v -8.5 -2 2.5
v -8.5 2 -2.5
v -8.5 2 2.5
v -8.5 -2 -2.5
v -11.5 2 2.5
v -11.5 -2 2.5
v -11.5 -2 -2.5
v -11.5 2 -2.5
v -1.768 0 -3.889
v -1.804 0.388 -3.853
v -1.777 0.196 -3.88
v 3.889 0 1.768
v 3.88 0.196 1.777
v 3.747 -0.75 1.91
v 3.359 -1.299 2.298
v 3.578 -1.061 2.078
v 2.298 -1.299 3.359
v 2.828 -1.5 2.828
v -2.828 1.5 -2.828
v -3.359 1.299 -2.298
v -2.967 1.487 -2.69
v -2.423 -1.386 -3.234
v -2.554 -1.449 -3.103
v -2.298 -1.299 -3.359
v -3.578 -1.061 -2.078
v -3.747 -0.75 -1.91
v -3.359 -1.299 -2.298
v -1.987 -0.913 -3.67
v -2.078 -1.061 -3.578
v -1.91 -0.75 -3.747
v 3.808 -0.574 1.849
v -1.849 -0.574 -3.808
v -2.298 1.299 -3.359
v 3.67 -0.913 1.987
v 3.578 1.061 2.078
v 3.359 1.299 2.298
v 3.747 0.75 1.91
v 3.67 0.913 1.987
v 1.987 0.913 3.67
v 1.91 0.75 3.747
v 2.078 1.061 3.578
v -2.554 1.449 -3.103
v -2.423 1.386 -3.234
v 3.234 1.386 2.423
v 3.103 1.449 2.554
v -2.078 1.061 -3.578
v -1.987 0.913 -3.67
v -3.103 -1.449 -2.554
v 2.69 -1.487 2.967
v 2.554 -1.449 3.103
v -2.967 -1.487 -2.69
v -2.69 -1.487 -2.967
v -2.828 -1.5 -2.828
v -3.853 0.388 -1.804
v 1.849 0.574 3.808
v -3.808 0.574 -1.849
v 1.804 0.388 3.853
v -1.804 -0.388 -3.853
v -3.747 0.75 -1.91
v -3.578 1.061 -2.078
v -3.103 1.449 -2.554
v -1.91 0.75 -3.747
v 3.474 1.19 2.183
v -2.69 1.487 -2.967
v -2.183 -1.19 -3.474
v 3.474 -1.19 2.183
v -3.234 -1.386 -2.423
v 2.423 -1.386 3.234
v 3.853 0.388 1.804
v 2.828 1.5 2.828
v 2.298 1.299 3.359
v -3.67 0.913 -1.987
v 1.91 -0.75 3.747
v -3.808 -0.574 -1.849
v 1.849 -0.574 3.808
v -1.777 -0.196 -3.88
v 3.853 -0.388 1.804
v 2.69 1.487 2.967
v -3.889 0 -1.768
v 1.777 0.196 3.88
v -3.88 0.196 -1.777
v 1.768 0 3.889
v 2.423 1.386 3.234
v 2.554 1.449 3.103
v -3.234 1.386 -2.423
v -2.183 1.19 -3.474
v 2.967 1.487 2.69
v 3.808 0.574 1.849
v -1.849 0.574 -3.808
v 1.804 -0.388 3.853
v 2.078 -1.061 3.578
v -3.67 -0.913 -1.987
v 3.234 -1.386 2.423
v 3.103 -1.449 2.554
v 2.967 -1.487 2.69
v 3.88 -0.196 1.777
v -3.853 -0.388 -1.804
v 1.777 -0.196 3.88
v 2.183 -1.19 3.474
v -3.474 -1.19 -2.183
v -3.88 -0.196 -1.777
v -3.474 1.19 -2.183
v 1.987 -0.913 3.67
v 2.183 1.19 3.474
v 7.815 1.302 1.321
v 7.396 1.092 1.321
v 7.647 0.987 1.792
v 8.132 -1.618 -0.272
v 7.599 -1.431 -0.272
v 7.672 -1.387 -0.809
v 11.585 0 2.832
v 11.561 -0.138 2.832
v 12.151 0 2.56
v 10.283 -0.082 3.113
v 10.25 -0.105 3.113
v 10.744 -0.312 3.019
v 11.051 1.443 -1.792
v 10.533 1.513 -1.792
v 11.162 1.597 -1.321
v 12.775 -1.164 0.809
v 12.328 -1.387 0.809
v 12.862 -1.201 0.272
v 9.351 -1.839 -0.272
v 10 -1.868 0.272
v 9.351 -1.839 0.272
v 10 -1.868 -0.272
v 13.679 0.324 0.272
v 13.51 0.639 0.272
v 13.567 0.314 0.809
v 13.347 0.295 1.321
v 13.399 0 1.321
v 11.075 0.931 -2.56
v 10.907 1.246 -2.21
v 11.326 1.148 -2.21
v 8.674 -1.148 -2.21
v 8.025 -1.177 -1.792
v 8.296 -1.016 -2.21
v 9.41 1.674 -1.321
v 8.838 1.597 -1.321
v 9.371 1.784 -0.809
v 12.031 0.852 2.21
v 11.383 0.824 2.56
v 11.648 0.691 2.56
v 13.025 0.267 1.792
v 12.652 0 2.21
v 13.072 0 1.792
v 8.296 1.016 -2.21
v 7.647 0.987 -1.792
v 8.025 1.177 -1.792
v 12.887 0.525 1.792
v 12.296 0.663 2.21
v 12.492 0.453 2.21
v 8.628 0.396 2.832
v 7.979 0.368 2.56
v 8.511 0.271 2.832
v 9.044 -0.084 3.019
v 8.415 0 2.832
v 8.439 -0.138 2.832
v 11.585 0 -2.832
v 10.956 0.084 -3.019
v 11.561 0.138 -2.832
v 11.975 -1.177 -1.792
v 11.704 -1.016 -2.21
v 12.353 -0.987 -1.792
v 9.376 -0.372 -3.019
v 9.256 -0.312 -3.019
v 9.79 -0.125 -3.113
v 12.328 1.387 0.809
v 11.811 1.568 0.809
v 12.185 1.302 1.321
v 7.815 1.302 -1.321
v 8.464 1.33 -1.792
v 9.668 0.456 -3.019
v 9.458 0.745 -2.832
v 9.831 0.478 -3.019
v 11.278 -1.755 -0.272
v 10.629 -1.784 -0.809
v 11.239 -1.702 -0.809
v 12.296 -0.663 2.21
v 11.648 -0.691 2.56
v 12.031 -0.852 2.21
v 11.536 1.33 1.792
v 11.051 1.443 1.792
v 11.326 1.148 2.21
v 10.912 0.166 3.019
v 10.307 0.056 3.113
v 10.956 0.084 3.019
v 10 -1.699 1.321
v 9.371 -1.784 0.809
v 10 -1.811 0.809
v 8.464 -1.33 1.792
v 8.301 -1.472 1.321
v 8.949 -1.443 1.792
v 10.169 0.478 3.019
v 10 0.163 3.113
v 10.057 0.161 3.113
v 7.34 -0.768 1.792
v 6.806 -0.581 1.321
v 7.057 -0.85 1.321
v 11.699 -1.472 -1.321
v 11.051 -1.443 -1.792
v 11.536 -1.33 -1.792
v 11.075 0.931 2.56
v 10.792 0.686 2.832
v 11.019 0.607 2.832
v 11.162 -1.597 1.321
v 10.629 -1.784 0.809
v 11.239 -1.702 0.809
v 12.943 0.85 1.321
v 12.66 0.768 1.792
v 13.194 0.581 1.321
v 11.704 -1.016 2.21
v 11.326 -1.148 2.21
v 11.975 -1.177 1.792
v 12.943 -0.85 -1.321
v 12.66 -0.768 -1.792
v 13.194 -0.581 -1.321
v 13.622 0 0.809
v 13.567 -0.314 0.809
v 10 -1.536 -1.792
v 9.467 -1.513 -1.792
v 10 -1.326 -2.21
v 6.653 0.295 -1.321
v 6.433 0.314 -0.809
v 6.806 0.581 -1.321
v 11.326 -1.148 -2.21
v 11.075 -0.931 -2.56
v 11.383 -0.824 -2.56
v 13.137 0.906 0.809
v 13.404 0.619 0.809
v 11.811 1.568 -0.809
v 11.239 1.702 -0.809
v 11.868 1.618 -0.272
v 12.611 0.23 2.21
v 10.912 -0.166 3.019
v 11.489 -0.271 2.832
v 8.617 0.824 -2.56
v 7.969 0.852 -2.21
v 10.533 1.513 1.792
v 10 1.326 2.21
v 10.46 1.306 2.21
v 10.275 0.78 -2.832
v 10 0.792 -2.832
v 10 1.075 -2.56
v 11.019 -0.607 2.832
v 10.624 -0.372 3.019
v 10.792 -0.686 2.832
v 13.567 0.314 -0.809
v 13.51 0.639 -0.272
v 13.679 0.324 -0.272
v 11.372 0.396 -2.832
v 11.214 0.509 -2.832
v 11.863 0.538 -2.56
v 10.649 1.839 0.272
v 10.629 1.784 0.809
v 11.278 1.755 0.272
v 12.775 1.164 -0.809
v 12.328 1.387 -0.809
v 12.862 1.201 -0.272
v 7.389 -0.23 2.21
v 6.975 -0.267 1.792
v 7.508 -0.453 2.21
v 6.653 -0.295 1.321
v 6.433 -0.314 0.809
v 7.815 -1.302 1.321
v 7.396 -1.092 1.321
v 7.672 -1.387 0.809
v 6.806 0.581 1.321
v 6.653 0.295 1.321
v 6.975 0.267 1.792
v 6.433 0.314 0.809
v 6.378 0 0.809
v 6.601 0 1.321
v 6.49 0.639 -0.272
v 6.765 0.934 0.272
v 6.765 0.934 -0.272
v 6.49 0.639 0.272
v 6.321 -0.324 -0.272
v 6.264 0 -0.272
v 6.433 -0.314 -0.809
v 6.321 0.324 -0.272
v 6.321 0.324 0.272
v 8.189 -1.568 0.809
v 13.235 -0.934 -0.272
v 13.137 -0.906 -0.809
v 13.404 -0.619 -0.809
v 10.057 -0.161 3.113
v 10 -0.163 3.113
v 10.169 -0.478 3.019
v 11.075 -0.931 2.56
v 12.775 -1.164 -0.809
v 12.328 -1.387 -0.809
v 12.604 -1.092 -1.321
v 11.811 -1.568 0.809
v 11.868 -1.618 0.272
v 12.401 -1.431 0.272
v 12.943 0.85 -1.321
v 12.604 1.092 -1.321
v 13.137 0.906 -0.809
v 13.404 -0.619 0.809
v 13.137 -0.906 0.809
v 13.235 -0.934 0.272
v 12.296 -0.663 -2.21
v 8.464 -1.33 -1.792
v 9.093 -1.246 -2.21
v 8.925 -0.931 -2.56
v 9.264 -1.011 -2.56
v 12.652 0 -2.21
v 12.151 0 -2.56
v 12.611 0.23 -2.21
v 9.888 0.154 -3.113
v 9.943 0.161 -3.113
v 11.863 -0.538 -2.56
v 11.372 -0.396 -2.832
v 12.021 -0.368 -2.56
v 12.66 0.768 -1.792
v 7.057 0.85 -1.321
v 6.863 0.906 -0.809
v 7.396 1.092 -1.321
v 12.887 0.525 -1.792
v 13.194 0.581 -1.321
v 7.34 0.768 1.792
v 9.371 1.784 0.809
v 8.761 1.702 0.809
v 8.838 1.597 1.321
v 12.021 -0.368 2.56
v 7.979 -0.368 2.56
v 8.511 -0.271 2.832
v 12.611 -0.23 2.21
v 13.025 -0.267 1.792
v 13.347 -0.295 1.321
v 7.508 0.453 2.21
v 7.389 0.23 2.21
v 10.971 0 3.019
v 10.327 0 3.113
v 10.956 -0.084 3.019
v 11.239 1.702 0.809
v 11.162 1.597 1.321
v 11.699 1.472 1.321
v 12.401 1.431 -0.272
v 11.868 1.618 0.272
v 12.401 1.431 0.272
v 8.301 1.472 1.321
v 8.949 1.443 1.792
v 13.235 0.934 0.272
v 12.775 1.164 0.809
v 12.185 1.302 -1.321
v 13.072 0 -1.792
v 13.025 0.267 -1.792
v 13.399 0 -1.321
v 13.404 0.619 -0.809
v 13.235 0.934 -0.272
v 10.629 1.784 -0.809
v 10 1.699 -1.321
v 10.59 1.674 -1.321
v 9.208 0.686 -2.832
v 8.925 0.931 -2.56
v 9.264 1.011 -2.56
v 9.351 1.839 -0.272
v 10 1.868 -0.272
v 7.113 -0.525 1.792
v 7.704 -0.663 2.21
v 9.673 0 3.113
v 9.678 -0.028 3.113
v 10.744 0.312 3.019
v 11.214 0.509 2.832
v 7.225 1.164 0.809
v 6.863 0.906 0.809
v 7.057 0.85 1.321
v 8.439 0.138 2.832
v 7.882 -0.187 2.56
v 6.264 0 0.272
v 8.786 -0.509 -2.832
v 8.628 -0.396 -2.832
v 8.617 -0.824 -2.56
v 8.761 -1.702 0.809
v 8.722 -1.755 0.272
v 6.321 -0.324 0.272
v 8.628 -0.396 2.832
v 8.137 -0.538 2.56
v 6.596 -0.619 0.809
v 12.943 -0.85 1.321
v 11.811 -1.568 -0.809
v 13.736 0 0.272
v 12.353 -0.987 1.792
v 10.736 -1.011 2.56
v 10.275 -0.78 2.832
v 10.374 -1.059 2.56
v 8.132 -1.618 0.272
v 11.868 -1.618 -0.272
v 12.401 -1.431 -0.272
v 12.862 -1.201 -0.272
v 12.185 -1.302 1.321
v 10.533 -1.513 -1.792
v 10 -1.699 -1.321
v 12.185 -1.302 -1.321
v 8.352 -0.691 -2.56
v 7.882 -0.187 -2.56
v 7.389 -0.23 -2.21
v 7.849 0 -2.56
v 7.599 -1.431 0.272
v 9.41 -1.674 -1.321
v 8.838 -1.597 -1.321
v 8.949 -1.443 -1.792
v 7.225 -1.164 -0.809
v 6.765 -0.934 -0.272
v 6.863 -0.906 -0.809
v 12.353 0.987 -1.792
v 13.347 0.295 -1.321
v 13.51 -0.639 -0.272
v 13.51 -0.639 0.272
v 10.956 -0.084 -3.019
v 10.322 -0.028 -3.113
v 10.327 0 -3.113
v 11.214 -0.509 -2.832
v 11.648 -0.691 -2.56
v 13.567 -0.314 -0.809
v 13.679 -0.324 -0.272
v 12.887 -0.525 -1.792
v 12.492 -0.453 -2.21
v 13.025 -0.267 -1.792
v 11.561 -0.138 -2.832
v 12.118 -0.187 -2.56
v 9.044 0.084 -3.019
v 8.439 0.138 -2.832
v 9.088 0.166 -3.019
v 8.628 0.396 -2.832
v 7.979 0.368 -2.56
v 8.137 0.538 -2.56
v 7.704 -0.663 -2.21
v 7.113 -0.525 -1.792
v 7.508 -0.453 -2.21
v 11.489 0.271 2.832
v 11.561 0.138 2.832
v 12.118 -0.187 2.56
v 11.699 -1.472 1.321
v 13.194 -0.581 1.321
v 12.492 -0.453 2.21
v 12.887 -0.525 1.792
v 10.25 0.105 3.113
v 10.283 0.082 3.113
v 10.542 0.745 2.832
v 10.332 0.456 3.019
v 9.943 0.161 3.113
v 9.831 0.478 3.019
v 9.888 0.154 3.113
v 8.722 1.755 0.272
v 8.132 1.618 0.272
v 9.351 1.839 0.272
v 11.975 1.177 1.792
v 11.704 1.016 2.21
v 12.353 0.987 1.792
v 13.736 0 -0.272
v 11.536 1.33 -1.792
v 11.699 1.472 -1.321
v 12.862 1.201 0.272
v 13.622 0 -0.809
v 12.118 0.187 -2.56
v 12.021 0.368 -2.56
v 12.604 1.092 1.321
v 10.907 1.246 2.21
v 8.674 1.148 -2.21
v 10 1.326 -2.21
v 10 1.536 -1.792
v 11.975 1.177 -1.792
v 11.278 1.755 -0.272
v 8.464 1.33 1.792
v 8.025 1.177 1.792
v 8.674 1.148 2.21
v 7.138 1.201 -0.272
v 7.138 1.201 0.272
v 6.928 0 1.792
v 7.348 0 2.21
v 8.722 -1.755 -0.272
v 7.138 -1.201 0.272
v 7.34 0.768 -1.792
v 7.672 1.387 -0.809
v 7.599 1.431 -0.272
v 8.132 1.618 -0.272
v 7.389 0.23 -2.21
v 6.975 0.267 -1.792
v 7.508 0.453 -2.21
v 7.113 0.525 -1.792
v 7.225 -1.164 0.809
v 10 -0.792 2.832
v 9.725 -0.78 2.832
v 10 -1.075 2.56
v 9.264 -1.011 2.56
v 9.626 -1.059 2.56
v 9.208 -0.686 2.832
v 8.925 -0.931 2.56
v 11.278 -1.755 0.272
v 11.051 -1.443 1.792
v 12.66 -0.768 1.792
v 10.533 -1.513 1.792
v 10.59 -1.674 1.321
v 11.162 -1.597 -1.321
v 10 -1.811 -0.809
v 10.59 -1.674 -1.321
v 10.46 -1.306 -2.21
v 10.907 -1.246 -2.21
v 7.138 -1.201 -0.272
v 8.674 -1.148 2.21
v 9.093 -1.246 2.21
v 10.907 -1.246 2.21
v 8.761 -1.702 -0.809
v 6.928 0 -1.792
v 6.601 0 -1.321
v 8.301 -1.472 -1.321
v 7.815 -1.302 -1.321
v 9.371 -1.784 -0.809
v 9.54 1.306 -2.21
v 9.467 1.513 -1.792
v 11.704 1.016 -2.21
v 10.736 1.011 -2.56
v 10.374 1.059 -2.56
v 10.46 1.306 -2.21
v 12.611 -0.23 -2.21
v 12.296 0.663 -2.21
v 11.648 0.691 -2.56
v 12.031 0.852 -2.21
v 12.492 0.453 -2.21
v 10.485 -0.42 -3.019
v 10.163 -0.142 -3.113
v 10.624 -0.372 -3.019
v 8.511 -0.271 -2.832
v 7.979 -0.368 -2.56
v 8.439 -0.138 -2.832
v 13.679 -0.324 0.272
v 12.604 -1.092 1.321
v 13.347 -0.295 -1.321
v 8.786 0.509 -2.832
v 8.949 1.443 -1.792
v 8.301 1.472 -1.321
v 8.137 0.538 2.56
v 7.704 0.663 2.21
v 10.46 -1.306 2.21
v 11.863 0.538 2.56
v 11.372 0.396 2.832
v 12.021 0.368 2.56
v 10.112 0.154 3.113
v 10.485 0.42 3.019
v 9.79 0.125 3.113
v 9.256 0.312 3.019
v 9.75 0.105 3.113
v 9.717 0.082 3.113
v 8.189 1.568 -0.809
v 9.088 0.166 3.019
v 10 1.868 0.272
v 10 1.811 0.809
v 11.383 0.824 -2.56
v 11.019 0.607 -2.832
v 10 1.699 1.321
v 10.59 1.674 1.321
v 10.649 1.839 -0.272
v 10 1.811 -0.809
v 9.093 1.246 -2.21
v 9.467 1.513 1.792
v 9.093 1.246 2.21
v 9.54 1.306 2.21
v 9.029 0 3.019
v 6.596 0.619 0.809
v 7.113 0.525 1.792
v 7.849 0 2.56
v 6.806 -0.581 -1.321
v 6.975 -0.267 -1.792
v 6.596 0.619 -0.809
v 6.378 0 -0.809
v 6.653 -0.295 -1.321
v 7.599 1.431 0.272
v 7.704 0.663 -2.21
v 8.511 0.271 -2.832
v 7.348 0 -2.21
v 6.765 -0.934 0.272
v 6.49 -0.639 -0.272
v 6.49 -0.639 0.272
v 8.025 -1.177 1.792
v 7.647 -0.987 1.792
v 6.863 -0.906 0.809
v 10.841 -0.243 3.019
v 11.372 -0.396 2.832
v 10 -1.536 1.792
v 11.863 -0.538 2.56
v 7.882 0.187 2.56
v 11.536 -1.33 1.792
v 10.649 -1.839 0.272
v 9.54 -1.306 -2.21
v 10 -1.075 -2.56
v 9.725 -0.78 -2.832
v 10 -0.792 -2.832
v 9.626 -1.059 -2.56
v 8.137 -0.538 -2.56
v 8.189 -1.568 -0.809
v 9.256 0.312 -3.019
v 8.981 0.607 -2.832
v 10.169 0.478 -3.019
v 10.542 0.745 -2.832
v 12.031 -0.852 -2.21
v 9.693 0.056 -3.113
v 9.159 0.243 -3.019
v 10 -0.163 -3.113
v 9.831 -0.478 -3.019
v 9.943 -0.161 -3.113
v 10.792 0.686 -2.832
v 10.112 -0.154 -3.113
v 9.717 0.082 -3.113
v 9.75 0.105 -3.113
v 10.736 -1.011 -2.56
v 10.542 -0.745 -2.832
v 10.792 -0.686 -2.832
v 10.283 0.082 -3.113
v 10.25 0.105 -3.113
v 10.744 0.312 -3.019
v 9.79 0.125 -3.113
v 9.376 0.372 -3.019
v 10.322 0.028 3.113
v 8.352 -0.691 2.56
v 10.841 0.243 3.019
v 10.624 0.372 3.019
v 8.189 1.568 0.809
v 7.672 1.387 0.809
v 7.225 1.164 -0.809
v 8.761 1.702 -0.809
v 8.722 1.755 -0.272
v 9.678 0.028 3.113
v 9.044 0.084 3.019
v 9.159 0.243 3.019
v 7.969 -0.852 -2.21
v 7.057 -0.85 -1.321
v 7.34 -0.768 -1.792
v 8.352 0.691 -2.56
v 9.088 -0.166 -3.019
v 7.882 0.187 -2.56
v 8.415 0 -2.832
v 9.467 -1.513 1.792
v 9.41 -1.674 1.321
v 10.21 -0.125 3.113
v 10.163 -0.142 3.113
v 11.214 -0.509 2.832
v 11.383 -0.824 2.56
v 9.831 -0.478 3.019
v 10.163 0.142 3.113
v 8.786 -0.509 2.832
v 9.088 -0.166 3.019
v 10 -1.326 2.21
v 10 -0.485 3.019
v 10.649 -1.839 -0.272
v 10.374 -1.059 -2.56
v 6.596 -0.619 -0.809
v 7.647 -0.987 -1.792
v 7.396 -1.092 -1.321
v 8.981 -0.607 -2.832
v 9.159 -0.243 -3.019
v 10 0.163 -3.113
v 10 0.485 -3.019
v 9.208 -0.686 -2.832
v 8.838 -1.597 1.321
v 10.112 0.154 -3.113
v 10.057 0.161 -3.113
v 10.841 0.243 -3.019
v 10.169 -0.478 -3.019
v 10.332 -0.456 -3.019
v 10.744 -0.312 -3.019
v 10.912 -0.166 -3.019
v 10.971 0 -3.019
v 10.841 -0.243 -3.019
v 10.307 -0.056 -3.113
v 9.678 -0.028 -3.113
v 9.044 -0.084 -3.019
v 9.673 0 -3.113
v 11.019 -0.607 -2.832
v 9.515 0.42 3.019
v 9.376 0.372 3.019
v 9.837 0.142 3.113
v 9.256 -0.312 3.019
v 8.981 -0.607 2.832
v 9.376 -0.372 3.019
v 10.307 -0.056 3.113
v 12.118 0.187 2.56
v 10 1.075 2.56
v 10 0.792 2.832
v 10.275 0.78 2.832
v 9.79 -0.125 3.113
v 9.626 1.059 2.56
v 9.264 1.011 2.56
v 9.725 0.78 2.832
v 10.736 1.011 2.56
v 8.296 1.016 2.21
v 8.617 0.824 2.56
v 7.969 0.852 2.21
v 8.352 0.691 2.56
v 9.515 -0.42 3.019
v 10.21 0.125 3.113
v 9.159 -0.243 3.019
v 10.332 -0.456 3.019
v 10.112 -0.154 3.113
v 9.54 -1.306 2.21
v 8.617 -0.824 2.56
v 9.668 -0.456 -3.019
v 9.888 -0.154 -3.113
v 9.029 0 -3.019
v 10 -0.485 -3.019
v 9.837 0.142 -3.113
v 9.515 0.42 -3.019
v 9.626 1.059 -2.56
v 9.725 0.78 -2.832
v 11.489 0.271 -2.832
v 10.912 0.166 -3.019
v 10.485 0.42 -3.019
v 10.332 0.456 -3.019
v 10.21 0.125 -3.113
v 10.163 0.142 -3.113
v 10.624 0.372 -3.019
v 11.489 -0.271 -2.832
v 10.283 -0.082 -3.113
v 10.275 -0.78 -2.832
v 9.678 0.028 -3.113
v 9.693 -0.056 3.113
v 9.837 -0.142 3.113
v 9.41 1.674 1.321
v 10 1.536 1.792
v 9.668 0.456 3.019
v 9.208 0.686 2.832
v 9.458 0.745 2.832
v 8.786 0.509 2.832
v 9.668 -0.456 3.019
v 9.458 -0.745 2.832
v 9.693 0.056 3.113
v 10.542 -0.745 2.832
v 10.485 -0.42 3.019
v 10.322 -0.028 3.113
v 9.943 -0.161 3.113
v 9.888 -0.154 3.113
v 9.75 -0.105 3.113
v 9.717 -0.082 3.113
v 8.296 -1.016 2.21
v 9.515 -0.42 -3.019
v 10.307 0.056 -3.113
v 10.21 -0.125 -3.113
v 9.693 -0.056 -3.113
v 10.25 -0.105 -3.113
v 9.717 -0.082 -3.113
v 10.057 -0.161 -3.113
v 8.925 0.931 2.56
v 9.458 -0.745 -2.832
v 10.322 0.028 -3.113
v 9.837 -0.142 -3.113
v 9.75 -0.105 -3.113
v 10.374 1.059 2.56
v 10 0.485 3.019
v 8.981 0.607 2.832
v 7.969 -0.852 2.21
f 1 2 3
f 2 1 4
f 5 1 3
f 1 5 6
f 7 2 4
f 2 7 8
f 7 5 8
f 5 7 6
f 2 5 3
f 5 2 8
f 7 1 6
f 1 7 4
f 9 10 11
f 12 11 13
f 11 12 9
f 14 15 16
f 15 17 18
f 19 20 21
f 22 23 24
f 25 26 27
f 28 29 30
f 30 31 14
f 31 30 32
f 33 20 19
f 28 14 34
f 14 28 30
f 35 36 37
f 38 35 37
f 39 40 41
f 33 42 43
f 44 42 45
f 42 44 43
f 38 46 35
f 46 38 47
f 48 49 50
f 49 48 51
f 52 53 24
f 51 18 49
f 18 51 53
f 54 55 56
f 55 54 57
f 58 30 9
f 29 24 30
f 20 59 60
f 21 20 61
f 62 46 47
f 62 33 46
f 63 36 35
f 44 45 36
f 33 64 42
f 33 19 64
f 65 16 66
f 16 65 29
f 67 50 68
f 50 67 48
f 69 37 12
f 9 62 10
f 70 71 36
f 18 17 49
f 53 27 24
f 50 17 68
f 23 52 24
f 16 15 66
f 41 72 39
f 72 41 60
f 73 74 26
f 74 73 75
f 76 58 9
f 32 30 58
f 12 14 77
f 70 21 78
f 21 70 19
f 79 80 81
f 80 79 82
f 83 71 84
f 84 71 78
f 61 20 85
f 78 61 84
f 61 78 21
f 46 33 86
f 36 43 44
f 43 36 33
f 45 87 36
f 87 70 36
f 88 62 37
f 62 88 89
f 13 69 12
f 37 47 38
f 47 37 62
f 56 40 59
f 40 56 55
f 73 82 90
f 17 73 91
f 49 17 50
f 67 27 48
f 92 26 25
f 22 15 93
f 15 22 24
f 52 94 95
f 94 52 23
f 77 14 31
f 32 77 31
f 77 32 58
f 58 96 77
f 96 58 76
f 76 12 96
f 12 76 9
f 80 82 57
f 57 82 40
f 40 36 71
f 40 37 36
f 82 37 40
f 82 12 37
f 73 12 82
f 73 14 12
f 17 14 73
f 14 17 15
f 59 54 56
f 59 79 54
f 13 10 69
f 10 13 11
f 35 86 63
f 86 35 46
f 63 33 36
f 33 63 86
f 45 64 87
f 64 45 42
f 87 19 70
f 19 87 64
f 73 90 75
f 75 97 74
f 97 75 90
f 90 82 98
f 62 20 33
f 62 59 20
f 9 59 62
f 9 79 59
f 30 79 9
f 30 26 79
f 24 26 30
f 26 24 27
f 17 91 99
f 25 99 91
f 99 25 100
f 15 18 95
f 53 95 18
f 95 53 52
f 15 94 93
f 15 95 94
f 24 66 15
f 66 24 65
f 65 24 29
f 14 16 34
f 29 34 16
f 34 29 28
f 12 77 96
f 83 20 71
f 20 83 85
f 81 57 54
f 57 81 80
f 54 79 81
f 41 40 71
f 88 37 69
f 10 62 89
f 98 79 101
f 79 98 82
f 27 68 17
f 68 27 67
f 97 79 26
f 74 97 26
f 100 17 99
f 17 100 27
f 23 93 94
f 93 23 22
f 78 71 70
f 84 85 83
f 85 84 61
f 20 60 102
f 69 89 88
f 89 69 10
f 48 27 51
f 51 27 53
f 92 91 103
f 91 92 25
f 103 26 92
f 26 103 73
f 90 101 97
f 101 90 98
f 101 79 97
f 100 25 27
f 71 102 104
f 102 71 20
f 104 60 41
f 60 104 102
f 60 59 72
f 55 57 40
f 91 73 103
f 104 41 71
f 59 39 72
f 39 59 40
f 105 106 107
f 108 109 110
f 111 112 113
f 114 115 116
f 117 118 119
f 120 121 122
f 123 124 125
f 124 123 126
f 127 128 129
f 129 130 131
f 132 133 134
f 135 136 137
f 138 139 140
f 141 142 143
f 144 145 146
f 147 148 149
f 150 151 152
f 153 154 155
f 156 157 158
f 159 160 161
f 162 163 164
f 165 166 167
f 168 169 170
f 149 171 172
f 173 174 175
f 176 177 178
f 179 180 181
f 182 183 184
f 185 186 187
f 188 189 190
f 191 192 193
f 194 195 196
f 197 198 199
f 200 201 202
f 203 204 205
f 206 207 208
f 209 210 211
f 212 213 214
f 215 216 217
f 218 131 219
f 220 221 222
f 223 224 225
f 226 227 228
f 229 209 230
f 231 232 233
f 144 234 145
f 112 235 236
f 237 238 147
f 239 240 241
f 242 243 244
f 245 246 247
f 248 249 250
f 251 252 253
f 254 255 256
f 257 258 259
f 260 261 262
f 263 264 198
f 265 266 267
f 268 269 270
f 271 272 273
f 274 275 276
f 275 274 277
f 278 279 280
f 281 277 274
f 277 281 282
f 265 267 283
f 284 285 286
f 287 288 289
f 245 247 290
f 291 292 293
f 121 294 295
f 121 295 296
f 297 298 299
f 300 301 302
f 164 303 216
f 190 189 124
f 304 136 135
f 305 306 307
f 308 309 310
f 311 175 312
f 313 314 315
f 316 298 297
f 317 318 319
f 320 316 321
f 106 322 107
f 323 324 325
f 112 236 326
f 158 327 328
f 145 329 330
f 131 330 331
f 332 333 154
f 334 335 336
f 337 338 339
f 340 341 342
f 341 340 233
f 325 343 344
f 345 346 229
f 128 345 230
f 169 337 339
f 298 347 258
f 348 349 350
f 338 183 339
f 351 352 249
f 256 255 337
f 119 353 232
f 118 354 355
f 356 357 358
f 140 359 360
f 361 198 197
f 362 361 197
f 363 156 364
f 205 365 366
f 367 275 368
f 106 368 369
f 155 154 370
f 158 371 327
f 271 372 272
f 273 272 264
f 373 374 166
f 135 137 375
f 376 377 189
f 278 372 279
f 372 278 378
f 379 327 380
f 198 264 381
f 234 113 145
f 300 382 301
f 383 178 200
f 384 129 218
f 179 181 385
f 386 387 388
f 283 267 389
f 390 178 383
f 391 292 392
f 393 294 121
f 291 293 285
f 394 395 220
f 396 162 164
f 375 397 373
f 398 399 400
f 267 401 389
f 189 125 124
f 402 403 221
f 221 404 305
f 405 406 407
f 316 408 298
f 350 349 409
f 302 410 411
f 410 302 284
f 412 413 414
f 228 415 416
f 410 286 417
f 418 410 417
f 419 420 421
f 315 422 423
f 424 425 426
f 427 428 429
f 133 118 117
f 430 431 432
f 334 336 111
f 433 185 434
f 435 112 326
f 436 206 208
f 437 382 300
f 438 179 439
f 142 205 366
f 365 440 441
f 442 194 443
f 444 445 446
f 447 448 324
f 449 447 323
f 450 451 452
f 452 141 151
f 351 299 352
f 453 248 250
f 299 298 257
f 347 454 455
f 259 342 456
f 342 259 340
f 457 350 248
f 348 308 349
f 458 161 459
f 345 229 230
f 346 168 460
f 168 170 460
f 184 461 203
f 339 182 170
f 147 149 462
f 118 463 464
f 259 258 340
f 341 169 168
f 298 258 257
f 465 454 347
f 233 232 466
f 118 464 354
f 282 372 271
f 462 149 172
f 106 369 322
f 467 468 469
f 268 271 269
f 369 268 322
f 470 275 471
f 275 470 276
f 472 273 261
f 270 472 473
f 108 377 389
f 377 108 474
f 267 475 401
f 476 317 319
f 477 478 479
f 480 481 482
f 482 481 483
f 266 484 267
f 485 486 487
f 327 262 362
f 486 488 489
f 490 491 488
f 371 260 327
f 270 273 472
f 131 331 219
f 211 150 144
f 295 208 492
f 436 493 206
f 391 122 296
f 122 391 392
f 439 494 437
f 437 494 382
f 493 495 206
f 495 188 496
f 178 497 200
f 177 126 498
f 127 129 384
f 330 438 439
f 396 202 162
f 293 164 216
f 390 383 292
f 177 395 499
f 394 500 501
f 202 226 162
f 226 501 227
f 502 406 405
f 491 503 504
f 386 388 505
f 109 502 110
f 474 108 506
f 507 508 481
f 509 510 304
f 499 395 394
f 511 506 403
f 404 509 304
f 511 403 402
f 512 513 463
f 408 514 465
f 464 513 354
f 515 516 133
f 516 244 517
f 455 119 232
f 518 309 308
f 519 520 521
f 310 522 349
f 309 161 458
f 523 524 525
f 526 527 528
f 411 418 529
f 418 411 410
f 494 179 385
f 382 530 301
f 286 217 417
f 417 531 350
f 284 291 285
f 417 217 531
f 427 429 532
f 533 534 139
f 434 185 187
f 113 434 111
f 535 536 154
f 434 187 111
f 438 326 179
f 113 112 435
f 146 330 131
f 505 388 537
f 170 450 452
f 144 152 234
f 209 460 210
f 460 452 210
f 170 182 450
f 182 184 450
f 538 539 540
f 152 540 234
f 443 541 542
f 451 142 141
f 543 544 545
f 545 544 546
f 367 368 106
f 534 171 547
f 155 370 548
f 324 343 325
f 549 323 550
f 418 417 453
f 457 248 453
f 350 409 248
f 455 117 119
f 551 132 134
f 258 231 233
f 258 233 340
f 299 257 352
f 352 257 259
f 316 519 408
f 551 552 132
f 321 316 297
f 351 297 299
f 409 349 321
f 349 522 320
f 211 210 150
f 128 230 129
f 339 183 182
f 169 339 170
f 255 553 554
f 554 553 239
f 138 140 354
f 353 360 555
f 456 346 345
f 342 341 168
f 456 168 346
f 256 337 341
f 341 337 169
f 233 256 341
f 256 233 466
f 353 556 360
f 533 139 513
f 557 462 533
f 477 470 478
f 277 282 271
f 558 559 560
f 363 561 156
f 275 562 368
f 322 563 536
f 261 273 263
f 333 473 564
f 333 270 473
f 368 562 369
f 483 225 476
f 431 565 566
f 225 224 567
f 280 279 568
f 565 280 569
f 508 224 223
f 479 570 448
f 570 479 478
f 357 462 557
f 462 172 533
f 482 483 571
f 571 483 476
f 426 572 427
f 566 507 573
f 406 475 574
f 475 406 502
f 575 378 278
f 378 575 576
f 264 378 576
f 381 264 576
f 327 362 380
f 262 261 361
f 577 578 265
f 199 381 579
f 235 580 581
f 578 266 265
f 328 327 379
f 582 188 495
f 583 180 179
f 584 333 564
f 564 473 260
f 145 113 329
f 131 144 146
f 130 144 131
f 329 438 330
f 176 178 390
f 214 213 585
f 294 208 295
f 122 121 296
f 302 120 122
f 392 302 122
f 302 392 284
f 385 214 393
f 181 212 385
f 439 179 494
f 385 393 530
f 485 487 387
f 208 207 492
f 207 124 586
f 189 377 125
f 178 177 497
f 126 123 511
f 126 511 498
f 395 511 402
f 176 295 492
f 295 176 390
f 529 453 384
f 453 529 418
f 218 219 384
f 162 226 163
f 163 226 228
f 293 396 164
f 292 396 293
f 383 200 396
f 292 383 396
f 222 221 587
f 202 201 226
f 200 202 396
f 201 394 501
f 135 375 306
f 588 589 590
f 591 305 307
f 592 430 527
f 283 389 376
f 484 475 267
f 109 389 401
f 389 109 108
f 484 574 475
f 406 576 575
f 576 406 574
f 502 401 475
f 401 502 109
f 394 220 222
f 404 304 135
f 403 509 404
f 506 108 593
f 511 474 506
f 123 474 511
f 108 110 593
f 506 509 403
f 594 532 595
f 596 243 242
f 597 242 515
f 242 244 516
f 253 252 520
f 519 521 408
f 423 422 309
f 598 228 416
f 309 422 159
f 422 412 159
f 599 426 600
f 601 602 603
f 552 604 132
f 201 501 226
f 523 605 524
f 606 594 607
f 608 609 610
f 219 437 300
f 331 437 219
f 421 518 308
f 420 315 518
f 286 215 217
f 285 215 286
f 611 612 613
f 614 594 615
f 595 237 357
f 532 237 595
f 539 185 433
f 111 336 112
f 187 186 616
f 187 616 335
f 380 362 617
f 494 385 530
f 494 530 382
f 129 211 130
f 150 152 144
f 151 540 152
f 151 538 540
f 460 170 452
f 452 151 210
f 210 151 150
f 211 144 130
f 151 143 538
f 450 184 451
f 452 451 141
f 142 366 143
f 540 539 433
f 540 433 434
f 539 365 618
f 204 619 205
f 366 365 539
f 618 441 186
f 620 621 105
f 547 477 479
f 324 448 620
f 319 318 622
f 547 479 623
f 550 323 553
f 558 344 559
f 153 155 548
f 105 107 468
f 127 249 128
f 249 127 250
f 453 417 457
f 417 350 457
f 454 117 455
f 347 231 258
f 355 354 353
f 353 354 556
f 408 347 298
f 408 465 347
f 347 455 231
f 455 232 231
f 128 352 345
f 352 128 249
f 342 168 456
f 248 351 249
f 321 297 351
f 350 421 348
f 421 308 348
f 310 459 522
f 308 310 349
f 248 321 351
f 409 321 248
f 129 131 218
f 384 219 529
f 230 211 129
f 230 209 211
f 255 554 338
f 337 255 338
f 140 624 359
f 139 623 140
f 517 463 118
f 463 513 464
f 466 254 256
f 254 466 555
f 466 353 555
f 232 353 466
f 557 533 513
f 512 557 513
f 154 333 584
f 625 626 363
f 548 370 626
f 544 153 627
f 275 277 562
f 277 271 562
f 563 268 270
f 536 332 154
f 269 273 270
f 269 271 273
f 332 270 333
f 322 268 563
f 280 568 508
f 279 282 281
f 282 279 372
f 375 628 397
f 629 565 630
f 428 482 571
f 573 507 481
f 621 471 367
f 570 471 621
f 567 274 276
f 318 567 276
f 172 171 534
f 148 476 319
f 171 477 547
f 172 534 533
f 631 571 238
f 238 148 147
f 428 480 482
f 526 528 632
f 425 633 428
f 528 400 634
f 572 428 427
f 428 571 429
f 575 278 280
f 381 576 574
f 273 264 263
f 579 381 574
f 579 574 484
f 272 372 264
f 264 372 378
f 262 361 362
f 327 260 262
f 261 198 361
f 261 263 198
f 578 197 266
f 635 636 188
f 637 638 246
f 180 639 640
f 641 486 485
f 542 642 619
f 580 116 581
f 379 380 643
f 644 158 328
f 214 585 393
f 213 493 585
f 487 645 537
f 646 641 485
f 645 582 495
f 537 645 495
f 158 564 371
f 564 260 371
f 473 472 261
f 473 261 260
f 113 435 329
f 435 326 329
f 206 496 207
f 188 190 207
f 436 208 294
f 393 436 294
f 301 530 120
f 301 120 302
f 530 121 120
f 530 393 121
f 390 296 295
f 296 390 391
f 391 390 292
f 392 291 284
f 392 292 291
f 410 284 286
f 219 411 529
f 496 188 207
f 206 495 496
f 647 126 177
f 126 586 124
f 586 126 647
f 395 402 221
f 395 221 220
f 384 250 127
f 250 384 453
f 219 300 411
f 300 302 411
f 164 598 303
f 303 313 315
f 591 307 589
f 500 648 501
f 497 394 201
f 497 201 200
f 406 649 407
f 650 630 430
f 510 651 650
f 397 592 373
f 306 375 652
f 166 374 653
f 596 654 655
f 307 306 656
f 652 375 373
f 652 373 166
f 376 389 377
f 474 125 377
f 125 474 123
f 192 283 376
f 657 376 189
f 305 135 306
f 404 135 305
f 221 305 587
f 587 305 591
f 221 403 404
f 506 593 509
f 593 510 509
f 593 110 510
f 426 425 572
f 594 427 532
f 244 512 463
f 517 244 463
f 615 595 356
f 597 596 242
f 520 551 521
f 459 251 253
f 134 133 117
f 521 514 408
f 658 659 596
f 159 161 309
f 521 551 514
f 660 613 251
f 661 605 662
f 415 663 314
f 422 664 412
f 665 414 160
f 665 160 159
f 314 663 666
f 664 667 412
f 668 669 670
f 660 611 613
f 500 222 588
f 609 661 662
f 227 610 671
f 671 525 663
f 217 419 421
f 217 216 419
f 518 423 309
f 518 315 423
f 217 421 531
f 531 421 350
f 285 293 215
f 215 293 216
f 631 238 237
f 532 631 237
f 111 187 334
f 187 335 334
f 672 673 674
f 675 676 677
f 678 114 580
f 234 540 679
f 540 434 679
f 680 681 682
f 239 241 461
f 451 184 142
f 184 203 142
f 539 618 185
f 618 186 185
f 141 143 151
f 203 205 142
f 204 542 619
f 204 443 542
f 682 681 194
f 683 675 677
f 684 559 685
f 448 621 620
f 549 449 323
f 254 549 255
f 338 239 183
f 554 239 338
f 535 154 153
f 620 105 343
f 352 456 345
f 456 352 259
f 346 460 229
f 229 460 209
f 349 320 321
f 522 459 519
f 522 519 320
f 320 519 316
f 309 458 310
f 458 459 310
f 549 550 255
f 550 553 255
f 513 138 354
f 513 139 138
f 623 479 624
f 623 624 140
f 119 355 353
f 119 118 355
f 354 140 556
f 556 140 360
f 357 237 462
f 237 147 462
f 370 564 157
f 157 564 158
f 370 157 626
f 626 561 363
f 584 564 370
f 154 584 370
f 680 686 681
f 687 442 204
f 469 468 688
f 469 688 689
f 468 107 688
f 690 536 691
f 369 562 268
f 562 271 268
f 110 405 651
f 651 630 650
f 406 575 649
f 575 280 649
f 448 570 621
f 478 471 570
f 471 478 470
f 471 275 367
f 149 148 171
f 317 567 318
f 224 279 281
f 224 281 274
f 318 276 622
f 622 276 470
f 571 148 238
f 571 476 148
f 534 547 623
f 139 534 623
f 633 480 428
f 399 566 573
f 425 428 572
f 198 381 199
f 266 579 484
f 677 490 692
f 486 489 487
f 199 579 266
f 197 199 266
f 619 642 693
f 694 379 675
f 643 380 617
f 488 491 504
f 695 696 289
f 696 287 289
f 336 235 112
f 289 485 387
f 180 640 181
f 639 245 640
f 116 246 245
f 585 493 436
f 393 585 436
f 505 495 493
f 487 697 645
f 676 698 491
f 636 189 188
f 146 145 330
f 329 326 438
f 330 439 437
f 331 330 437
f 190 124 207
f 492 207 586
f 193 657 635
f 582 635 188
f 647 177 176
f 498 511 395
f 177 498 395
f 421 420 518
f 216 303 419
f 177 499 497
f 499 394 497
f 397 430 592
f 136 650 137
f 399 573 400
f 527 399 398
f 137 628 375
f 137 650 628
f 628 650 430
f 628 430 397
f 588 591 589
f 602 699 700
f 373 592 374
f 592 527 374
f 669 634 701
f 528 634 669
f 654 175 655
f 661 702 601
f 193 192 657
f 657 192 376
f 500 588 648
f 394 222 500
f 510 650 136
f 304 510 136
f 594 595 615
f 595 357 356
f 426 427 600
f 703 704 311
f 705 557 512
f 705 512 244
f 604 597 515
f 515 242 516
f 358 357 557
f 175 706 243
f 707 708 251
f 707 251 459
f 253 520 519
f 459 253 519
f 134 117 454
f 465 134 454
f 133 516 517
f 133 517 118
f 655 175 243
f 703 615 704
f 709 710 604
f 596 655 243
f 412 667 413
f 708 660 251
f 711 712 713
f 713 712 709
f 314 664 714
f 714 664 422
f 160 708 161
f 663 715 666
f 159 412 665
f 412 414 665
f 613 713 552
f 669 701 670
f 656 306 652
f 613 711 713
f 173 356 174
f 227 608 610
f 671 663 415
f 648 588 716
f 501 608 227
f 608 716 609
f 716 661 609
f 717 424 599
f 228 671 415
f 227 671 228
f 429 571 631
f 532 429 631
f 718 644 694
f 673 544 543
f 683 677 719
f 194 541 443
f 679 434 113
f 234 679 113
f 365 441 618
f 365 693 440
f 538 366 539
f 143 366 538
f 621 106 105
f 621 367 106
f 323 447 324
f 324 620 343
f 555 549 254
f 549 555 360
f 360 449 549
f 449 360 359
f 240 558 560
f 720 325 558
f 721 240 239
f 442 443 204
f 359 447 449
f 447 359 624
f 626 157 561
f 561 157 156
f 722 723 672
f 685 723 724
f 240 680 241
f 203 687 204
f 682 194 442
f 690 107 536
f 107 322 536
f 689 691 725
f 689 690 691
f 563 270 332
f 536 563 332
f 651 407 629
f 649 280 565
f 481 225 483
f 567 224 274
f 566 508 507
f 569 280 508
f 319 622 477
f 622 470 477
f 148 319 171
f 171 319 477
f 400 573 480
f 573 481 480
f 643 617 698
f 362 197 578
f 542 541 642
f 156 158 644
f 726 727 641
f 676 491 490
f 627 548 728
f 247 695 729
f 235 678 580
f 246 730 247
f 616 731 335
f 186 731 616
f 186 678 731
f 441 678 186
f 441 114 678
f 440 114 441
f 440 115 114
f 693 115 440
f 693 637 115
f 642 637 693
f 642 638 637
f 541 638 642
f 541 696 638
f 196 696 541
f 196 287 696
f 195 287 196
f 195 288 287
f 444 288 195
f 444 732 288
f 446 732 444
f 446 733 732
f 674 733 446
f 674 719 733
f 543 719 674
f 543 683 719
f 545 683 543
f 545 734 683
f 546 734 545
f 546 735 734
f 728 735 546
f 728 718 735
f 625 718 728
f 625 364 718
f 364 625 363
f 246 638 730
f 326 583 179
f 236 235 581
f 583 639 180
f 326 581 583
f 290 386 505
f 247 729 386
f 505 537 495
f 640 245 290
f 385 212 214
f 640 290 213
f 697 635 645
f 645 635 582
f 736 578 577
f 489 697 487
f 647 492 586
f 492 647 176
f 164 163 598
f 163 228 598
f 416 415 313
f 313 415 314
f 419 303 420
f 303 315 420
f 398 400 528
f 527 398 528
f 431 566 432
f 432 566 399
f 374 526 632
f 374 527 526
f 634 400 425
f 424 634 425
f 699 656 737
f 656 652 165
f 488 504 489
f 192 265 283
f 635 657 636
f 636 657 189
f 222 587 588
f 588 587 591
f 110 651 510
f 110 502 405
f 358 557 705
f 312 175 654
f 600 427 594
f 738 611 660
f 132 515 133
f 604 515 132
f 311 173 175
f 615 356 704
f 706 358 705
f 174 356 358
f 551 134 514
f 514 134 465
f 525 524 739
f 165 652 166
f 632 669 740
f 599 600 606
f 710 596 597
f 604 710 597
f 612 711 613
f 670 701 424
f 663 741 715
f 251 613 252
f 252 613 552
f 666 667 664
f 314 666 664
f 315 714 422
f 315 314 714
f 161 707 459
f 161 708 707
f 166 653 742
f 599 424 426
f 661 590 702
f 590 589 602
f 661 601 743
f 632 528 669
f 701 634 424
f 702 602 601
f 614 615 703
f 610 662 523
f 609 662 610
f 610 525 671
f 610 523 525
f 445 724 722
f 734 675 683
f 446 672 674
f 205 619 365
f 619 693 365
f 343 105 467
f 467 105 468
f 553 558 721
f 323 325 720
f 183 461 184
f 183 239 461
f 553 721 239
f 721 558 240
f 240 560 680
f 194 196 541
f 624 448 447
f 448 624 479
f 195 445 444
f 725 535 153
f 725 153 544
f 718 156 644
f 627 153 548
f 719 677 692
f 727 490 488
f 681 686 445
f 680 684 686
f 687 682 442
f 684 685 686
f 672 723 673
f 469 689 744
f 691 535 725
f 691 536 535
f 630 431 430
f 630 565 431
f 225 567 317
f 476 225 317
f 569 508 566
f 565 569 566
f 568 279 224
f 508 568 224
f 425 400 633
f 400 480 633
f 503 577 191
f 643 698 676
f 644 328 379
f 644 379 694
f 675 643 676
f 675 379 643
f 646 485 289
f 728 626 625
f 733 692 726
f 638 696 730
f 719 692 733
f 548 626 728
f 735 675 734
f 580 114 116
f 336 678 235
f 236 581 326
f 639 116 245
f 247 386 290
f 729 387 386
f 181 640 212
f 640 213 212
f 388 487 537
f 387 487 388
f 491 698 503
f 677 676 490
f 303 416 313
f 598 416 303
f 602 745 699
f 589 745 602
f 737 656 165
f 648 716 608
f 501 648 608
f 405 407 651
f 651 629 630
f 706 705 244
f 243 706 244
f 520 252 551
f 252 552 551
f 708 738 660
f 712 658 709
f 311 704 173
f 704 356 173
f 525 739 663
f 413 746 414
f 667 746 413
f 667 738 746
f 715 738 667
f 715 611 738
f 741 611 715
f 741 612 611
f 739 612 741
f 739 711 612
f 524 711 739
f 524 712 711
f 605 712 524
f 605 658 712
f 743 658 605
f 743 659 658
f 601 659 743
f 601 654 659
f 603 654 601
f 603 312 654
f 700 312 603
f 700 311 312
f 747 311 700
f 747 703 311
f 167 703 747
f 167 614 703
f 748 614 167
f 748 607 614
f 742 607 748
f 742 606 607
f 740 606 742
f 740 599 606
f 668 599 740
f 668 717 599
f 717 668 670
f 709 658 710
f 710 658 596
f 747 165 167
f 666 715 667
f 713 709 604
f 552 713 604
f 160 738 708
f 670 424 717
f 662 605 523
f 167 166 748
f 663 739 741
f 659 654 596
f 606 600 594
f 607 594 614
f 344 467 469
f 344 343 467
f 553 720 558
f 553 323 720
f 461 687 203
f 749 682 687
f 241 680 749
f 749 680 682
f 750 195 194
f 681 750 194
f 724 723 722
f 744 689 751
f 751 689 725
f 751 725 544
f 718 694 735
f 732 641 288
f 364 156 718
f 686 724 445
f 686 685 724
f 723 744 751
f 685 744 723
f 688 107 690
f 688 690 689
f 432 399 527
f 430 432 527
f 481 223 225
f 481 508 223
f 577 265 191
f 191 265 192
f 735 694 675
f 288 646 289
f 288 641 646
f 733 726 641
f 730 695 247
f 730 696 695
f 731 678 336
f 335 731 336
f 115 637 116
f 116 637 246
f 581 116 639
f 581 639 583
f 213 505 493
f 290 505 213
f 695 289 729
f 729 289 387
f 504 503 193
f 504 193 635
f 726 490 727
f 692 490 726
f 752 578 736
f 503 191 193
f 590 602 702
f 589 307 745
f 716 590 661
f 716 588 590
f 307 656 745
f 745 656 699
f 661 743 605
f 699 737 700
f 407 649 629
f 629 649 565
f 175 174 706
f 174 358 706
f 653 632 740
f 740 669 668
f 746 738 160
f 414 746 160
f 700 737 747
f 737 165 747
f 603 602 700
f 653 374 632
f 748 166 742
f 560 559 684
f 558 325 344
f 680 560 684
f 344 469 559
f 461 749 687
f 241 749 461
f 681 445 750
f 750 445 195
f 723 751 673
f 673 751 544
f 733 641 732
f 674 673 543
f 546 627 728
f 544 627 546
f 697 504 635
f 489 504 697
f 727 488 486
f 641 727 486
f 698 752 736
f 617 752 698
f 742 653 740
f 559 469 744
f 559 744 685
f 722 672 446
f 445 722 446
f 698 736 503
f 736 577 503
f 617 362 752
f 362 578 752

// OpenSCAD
union() {
    translate([-10, 0, 0])
        cube([3, 4, 5], center = true);

    rotate([0, 45, 0])
        cylinder(h = 8, r = 1.5, center = true, $fn = 48);

    translate([10, 0, 0])
        scale([1.5, 0.75, 1.25])
            sphere(r = 2.5, $fn = 36);
}
